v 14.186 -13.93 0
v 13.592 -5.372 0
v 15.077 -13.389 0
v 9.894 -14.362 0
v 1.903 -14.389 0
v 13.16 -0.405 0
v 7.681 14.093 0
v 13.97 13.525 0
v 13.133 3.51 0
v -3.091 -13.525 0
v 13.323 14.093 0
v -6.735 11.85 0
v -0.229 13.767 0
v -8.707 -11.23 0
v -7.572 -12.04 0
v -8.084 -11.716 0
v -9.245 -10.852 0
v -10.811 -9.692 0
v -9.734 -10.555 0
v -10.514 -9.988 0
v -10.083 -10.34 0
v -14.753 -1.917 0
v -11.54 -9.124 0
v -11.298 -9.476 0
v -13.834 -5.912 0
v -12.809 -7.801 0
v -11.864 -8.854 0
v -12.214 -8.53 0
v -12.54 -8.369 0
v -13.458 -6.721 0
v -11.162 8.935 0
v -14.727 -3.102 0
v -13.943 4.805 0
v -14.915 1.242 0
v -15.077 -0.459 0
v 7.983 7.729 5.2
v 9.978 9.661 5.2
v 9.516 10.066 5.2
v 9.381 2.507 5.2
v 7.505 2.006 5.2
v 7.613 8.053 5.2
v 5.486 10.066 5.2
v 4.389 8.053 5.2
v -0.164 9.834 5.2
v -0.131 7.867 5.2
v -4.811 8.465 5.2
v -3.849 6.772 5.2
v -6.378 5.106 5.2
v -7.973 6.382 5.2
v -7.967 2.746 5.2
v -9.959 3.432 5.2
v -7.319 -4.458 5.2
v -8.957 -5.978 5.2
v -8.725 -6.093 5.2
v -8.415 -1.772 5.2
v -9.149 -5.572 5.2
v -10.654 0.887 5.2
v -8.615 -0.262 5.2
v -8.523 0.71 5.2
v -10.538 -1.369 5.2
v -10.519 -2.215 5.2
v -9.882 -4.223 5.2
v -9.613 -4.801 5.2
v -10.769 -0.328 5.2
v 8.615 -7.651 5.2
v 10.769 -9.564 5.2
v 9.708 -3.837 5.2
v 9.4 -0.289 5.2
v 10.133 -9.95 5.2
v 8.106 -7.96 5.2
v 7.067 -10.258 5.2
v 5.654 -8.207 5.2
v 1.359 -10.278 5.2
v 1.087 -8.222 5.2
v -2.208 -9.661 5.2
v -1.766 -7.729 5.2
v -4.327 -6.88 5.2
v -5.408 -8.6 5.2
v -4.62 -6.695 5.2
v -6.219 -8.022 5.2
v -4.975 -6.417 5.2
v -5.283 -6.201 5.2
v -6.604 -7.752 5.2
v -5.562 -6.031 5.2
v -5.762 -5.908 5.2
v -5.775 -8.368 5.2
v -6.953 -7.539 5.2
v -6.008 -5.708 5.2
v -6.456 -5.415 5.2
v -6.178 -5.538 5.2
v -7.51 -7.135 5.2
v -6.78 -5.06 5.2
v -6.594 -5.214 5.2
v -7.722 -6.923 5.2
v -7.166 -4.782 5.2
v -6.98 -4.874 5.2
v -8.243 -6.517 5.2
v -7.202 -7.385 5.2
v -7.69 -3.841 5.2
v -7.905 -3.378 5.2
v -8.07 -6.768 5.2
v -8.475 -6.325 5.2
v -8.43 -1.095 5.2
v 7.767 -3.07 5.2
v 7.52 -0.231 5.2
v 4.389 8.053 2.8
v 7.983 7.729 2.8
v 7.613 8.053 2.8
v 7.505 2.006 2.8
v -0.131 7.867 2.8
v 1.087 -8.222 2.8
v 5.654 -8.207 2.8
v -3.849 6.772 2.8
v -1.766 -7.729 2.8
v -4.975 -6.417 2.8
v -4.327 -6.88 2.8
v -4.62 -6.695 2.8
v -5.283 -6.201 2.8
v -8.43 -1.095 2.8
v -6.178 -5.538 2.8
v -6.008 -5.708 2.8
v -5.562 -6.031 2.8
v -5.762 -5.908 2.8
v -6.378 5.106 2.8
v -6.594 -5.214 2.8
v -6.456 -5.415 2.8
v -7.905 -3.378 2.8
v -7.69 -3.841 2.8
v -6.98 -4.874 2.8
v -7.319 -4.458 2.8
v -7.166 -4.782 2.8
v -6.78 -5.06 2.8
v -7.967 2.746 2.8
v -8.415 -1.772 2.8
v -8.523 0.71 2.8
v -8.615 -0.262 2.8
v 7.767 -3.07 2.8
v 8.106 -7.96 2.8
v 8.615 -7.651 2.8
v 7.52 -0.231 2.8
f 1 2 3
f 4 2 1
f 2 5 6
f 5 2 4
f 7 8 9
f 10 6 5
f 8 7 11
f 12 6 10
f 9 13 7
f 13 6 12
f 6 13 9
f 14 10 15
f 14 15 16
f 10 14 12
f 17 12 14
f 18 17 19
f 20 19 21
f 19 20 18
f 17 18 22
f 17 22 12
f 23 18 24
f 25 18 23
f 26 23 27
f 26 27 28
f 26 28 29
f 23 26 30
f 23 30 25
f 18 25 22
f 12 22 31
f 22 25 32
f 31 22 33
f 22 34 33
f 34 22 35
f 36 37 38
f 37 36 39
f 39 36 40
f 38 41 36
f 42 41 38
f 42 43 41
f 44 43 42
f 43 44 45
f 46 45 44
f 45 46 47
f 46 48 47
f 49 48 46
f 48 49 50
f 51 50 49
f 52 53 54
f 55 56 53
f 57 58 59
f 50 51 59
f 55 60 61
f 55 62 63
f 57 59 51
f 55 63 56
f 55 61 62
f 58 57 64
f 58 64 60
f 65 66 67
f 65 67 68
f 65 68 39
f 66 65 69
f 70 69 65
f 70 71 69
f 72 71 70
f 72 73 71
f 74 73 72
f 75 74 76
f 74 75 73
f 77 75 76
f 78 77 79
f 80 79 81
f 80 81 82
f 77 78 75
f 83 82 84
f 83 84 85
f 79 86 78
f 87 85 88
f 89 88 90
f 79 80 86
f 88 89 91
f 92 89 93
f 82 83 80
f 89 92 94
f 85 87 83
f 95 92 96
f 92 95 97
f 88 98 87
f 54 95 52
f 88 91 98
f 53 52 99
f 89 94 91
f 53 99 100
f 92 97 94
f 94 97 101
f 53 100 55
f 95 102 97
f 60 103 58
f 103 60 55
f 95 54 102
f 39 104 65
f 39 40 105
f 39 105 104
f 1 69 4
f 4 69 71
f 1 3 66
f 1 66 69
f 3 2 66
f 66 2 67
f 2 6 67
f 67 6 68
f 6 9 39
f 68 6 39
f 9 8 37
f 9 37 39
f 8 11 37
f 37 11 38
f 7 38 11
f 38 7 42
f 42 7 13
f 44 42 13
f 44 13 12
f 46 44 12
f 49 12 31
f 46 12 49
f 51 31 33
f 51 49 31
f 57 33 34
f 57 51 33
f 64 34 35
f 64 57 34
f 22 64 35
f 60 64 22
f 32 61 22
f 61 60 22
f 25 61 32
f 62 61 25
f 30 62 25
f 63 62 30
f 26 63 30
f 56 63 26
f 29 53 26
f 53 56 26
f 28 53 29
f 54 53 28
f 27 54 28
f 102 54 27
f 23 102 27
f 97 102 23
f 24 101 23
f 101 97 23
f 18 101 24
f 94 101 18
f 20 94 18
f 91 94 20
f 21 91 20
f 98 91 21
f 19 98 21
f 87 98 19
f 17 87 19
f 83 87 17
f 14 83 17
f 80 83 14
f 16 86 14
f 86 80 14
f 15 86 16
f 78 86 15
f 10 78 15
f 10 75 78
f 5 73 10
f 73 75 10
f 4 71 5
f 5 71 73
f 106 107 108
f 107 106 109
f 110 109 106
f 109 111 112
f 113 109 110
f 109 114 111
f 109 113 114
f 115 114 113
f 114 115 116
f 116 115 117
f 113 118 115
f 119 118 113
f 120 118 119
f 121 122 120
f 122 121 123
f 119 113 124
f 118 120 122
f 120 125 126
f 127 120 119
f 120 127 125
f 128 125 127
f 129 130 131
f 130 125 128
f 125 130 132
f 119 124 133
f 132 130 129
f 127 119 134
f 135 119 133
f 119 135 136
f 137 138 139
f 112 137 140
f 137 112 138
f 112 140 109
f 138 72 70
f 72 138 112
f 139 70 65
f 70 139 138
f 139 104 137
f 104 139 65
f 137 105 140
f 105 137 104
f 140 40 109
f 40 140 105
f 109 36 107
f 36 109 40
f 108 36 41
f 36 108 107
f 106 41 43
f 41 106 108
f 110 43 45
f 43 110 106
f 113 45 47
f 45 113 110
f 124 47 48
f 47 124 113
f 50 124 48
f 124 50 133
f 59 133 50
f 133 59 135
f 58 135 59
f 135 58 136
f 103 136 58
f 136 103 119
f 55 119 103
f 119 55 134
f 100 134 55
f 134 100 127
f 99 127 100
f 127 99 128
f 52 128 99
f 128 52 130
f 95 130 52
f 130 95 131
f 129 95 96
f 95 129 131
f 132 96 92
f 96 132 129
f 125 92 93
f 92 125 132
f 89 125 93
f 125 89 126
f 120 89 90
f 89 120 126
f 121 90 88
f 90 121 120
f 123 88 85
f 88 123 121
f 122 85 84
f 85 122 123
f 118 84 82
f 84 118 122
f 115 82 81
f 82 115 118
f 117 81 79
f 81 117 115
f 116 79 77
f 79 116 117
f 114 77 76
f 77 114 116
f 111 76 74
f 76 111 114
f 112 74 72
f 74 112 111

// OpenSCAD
// file: mod_traced_plastic_piece.scad
/*
Traced from the supplied overhead photograph.

Overall width: 28.0 mm
Approximate height from photograph: 26.722 mm
Thickness: 1.0 mm

The photograph provides reliable plan-view geometry but not reliable
depth information for the molded-looking surface features, so this model
reproduces the outside profile as a uniform 1 mm thick part.
*/

part_width = 28.0;
part_thickness = 1.0;

module plastic_piece_2d() {
    polygon(points=[
        [12.972, 12.559],
        [12.371, 13.086],
        [11.769, 13.086],
        [7.132, 13.086],
        [-0.213, 12.784],
        [-6.254, 11.004],
        [-10.365, 8.297],
        [-12.947, 4.462],
        [-13.850, 1.153],
        [-14.000, -0.426],
        [-13.699, -1.780],
        [-13.675, -2.880],
        [-12.846, -5.490],
        [-12.497, -6.241],
        [-11.894, -7.244],
        [-11.644, -7.771],
        [-11.342, -7.921],
        [-11.017, -8.222],
        [-10.716, -8.472],
        [-10.491, -8.799],
        [-10.039, -9.000],
        [-9.763, -9.275],
        [-9.363, -9.601],
        [-9.039, -9.801],
        [-8.585, -10.077],
        [-8.085, -10.428],
        [-7.507, -10.879],
        [-7.031, -11.180],
        [-2.870, -12.559],
        [1.767, -13.361],
        [9.187, -13.336],
        [13.173, -12.935],
        [14.000, -12.433],
        [12.621, -4.988],
        [12.220, -0.376],
        [12.195, 3.259]
    ]);
}

linear_extrude(height=part_thickness, convexity=10)
    plastic_piece_2d();
// main file
//use <traced_plastic_piece.scad>
use <mod_traced_plastic_piece.scad>
//use <trace_sharp.scad>

$fn=64;
sf=28/26;
cutF=16/26;
difference()
{
linear_extrude(height=5.2, convexity=10, scale=20/28)
    scale([sf,sf])plastic_piece_2d();

translate([0,0,5.2-2.4])linear_extrude(height=2.4, convexity=10)
    scale([cutF,cutF])plastic_piece_2d();


}




//translate([0,0,5.2])linear_extrude(height=0.01, convexity=10)
//    scale([20/28,20/28,1])plastic_piece_2d();
